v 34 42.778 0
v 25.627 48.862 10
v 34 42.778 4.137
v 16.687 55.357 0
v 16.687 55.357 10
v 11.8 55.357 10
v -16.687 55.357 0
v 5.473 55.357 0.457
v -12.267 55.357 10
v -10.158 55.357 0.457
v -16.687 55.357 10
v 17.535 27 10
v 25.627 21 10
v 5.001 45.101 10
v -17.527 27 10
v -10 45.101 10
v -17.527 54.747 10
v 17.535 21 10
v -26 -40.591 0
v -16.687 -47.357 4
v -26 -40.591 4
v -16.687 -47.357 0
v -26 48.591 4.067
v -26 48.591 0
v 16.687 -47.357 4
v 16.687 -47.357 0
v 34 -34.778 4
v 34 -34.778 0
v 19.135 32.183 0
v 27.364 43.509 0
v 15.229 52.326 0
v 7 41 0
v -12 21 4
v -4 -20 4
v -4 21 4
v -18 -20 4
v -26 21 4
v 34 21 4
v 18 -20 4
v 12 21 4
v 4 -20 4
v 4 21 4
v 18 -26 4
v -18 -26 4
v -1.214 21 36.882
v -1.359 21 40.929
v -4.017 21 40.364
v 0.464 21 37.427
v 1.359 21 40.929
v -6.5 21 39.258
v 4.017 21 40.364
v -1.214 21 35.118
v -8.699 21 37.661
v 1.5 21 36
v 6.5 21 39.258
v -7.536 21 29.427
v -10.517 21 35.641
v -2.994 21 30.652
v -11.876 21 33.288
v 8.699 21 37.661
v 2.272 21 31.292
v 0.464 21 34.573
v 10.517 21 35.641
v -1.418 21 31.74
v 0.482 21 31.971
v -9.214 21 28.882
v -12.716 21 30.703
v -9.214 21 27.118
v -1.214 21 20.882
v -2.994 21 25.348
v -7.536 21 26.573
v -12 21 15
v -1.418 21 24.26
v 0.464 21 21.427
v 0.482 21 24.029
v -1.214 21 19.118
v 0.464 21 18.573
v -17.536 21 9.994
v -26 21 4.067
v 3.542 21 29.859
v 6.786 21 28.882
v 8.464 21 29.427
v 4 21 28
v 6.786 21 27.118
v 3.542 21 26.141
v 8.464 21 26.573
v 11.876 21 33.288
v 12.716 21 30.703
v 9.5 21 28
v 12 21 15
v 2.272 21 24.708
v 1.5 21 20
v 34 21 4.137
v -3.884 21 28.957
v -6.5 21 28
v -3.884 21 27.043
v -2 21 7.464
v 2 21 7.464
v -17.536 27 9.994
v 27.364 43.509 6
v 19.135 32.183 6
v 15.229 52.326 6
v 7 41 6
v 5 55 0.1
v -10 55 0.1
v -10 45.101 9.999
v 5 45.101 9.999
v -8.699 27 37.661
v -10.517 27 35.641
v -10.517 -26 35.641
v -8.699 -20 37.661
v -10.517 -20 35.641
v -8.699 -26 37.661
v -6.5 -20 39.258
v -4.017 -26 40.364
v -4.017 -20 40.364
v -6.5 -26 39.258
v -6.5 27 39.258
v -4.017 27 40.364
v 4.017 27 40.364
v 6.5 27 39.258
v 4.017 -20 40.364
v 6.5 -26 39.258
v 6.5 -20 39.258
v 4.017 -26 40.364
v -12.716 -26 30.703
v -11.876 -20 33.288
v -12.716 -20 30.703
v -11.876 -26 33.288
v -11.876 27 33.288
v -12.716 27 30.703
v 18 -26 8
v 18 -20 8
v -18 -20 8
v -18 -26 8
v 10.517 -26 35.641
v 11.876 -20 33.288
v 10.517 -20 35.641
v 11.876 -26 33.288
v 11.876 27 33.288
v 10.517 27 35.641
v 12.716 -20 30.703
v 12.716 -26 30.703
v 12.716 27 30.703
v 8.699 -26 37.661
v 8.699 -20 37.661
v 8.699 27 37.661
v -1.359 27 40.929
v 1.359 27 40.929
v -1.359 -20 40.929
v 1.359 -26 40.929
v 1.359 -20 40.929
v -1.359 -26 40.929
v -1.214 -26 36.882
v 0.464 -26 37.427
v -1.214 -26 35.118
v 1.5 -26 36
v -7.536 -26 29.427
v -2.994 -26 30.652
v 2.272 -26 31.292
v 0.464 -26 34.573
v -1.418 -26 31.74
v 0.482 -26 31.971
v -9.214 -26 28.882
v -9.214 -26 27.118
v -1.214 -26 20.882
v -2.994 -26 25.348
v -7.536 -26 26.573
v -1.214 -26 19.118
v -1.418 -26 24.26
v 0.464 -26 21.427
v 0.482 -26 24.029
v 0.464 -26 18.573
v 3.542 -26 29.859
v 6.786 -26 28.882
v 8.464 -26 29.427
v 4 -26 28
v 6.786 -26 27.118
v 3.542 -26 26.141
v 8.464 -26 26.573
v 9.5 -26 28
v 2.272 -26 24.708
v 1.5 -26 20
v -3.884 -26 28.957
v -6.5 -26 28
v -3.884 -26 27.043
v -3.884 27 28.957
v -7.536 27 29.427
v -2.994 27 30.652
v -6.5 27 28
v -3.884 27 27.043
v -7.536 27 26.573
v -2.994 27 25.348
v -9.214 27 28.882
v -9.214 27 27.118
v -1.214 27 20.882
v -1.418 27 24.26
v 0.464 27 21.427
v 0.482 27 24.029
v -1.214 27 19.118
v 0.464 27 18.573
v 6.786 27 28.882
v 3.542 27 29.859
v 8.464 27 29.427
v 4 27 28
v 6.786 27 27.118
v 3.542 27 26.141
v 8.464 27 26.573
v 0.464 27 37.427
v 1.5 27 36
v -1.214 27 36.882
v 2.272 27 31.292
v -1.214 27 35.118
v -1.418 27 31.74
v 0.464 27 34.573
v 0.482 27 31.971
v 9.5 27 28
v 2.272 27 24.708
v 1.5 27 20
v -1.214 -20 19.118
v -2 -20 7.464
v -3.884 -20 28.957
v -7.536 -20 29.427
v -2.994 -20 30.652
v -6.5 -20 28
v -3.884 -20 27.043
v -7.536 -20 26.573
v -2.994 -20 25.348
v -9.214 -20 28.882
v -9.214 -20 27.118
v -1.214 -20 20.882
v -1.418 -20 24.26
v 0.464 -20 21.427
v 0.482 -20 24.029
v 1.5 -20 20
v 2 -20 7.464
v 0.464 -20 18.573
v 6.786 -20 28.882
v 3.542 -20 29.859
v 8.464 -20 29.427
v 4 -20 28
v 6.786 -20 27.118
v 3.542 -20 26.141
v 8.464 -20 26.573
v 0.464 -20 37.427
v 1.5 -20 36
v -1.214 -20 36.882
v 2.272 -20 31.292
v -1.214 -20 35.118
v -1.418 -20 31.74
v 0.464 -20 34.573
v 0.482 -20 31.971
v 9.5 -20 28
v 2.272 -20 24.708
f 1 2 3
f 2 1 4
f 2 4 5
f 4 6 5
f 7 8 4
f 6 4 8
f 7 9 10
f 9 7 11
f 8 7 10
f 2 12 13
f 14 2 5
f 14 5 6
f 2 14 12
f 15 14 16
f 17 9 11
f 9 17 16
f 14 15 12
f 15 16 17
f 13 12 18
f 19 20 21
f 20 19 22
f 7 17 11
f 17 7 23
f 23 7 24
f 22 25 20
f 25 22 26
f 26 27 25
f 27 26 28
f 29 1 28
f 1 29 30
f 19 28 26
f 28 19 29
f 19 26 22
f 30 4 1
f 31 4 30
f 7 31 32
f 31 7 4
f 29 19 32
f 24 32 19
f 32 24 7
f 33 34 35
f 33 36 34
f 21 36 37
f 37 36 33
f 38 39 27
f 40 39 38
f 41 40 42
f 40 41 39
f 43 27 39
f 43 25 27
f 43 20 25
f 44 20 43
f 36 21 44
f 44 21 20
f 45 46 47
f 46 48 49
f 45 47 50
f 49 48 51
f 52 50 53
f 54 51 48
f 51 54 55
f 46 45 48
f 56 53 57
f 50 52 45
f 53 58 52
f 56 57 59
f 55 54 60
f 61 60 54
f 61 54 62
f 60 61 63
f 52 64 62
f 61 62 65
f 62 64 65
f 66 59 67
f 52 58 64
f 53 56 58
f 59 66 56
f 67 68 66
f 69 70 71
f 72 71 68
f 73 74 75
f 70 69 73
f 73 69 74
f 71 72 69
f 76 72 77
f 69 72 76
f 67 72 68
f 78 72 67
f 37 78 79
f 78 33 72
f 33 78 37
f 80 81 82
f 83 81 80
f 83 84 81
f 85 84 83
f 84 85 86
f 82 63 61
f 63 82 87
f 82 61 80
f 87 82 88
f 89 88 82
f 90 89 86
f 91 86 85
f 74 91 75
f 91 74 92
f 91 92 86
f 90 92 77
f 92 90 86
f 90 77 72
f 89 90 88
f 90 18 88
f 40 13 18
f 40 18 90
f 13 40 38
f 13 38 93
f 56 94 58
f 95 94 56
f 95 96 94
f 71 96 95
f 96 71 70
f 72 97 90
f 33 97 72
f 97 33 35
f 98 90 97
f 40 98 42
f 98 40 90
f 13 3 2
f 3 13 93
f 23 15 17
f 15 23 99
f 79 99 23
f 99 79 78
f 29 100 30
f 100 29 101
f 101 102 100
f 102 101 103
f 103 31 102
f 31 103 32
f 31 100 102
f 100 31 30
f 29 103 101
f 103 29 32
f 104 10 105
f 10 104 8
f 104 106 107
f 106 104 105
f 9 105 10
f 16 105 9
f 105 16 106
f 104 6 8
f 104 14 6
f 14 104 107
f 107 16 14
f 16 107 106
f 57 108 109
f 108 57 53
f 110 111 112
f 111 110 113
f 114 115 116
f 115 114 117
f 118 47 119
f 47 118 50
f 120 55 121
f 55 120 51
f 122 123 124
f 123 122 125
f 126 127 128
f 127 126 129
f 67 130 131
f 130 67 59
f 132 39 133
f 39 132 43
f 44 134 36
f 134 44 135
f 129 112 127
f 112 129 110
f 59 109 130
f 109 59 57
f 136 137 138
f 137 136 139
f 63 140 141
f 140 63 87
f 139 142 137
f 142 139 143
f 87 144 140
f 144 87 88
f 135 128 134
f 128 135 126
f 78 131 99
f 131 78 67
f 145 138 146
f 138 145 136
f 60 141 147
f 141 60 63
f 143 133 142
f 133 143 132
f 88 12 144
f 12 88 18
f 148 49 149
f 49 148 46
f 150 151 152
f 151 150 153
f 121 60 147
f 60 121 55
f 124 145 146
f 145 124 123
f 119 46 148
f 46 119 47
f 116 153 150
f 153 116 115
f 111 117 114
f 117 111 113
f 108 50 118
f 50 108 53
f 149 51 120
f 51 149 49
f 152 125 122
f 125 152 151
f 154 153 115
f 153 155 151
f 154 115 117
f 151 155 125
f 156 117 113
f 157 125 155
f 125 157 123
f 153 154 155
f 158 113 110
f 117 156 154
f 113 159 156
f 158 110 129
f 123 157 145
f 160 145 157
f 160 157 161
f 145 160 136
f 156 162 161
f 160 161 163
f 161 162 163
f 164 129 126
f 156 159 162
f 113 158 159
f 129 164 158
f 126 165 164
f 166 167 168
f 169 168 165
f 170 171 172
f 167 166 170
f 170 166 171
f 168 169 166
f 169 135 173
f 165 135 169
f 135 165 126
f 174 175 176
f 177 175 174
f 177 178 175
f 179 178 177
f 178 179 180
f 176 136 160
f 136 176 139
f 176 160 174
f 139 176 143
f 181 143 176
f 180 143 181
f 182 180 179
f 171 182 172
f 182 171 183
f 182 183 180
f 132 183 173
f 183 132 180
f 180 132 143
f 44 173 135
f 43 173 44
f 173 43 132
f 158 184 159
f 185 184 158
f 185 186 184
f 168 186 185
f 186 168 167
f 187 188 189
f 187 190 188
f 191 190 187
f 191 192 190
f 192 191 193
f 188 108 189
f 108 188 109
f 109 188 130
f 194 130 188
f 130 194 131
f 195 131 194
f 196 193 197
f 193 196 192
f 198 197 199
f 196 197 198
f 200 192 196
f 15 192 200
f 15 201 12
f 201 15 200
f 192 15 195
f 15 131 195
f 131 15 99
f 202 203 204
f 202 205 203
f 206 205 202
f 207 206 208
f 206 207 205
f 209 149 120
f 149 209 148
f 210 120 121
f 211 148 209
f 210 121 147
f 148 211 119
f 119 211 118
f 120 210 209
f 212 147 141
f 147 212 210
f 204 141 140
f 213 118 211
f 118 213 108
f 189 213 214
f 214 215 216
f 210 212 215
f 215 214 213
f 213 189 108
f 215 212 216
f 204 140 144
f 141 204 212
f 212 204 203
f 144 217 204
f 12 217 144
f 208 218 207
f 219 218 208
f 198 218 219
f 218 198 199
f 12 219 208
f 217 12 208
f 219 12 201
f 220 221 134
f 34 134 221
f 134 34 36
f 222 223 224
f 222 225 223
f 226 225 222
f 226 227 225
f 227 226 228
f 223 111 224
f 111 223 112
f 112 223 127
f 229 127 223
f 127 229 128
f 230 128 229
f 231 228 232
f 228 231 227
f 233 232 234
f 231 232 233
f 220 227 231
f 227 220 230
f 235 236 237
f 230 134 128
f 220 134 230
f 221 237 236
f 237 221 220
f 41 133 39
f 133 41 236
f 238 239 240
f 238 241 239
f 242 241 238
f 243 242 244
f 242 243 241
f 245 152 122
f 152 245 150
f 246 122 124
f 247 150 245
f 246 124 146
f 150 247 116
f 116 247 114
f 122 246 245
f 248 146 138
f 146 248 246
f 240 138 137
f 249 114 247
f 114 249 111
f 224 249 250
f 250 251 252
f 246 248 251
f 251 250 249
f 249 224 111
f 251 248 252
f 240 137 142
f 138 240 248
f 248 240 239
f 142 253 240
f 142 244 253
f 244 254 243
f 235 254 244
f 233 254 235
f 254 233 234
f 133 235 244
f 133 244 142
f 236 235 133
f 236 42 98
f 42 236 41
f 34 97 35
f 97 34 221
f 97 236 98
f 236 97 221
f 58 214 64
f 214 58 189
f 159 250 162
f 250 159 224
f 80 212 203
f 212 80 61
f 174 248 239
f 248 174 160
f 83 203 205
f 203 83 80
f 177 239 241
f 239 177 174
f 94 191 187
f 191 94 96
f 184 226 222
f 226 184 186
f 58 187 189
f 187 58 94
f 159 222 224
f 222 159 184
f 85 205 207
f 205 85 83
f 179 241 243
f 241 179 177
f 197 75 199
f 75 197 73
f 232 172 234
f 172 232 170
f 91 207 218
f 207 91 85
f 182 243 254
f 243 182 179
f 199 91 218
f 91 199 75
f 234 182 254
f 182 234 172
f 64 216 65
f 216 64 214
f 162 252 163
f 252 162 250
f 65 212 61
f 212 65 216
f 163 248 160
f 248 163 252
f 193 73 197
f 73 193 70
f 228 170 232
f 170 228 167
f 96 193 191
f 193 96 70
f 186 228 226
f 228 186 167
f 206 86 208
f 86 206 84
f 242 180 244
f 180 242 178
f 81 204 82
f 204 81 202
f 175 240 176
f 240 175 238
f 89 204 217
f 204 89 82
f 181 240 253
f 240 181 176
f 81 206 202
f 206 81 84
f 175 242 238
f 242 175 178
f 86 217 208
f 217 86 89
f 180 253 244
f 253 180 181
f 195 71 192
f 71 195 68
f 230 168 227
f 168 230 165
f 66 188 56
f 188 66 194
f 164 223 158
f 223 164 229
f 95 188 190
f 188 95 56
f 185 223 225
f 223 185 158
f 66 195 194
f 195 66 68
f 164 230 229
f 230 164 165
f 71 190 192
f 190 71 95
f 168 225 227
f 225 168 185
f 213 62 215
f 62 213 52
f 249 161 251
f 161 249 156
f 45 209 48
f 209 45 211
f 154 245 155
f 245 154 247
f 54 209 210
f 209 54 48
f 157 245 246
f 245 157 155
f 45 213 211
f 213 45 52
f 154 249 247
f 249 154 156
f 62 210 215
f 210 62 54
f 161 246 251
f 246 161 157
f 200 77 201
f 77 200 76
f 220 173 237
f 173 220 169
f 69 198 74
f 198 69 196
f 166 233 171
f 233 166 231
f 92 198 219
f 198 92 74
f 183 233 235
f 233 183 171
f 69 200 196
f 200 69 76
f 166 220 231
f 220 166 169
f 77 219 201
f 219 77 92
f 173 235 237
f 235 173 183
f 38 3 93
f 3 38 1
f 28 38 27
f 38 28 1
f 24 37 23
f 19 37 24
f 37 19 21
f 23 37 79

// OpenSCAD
// file: raid3r/raid3r.scad
/*Pequeña biblioteca con las funciones mas comunes*/

module agujereado(X,Y,H){
	union(){
		for(j=[0:X-1])
		{
			translate([0,j*8,0])
			{
				for(i=[0:Y-1])
				{
					translate([i*6,0,-1])cylinder(r=1.2, h=H, $fn=10);
				}
			}
		}
	}
}

module dynahole(H){
	translate([-45.5/2,-10,1])union(){
		translate([3.5+6,16,0])agujereado(4,1,H);
		translate([9.5+26.5,16,0])agujereado(4,1,H);
		translate([45.5/2,10,-1])cylinder(r=11.5,h=H);	
		translate([(45.5-20)/2,6.5,-1])cube([20,36,H]);
		translate([22.5,46,0])union(){
			translate([7,0,-1])cylinder(r=1.5, h=H, $fn=10);
			translate([-7,0,-1])cylinder(r=1.5, h=H, $fn=10);
		}
	}
}

module cruz(H){
	translate([-34,-13,3])union(){
		translate([34,13,-3]) cylinder(r=4,h=H);
		translate([42,13,-3]) cylinder(r=1.5,h=H);
		translate([26,13,-3]) cylinder(r=1.5,h=H);
		translate([34,21,-3]) cylinder(r=1.5,h=H);
		translate([34,5,-3]) cylinder(r=1.5,h=H);
	}
}

module miniservo(H){
	translate([-15,-7,0])union(){
		translate([15,7,0])rotate([0,0,0])cylinder(r=8,h=H);
		translate([-1.75,7,0])union(){
			cylinder(r=1.5, h=H,$fn=20);
			translate([27.5,0,0])cylinder(r=1.5, h=H,$fn=20);
		}
	}
}
// main file
use <raid3r/raid3r.scad>



difference()
{
	union(){
		difference(){
			translate([0,4,0])cylinder(r=54,h=10, $fn=10);
			translate([-50,-79,4])cube(100);
			translate([42,0,15.8])rotate([-90,-10,0])cylinder(r=20,h=120,$fn=4);
			translate([-33.9,0,15.8])rotate([-90,10,0])cylinder(r=20,h=120,$fn=4);
			translate([7,41,-14])rotate([0,0,-36])cube([15,14,20]);
			hull(){
				translate([-10,55,0.1])rotate([45,0,0]){
					cube([15,10,14]);
					translate([-5,16,0])cube([15+20,10,14]);
				}
			}

			//hull(){
			//	translate([-14,45,-1])rotate([0,0,-30])cube([15,2,20]);
			//	translate([-12,56,-1])cube([24,2,20]);
			//}

		}
		translate([-12,21,0])cube([24,3,15]);
		mirror([0,1,0])translate([-12,21,0])cube([24,3,15]);
		difference(){
			hull(){	
				translate([-18,-26,0])cube([36,53,8]);
				translate([0,27,28])rotate([90,0,0])cylinder(r=13,h=53);
			}
			translate([-20,-20,4])cube([40,41,60]);
		}
		translate([0,27,4])rotate([90,0,0])cylinder(r=4,h=53,$fn=6);

	}
					translate([0,30,28])rotate([90,0,0])cruz(60);
	translate([34,-50,-5])cube([60,100,20]);
	mirror([1,0,0])translate([26,-50,-5])cube([60,100,20]);
}

//color("blue")translate([-50,55+20,0])cube([100,70,30]);
